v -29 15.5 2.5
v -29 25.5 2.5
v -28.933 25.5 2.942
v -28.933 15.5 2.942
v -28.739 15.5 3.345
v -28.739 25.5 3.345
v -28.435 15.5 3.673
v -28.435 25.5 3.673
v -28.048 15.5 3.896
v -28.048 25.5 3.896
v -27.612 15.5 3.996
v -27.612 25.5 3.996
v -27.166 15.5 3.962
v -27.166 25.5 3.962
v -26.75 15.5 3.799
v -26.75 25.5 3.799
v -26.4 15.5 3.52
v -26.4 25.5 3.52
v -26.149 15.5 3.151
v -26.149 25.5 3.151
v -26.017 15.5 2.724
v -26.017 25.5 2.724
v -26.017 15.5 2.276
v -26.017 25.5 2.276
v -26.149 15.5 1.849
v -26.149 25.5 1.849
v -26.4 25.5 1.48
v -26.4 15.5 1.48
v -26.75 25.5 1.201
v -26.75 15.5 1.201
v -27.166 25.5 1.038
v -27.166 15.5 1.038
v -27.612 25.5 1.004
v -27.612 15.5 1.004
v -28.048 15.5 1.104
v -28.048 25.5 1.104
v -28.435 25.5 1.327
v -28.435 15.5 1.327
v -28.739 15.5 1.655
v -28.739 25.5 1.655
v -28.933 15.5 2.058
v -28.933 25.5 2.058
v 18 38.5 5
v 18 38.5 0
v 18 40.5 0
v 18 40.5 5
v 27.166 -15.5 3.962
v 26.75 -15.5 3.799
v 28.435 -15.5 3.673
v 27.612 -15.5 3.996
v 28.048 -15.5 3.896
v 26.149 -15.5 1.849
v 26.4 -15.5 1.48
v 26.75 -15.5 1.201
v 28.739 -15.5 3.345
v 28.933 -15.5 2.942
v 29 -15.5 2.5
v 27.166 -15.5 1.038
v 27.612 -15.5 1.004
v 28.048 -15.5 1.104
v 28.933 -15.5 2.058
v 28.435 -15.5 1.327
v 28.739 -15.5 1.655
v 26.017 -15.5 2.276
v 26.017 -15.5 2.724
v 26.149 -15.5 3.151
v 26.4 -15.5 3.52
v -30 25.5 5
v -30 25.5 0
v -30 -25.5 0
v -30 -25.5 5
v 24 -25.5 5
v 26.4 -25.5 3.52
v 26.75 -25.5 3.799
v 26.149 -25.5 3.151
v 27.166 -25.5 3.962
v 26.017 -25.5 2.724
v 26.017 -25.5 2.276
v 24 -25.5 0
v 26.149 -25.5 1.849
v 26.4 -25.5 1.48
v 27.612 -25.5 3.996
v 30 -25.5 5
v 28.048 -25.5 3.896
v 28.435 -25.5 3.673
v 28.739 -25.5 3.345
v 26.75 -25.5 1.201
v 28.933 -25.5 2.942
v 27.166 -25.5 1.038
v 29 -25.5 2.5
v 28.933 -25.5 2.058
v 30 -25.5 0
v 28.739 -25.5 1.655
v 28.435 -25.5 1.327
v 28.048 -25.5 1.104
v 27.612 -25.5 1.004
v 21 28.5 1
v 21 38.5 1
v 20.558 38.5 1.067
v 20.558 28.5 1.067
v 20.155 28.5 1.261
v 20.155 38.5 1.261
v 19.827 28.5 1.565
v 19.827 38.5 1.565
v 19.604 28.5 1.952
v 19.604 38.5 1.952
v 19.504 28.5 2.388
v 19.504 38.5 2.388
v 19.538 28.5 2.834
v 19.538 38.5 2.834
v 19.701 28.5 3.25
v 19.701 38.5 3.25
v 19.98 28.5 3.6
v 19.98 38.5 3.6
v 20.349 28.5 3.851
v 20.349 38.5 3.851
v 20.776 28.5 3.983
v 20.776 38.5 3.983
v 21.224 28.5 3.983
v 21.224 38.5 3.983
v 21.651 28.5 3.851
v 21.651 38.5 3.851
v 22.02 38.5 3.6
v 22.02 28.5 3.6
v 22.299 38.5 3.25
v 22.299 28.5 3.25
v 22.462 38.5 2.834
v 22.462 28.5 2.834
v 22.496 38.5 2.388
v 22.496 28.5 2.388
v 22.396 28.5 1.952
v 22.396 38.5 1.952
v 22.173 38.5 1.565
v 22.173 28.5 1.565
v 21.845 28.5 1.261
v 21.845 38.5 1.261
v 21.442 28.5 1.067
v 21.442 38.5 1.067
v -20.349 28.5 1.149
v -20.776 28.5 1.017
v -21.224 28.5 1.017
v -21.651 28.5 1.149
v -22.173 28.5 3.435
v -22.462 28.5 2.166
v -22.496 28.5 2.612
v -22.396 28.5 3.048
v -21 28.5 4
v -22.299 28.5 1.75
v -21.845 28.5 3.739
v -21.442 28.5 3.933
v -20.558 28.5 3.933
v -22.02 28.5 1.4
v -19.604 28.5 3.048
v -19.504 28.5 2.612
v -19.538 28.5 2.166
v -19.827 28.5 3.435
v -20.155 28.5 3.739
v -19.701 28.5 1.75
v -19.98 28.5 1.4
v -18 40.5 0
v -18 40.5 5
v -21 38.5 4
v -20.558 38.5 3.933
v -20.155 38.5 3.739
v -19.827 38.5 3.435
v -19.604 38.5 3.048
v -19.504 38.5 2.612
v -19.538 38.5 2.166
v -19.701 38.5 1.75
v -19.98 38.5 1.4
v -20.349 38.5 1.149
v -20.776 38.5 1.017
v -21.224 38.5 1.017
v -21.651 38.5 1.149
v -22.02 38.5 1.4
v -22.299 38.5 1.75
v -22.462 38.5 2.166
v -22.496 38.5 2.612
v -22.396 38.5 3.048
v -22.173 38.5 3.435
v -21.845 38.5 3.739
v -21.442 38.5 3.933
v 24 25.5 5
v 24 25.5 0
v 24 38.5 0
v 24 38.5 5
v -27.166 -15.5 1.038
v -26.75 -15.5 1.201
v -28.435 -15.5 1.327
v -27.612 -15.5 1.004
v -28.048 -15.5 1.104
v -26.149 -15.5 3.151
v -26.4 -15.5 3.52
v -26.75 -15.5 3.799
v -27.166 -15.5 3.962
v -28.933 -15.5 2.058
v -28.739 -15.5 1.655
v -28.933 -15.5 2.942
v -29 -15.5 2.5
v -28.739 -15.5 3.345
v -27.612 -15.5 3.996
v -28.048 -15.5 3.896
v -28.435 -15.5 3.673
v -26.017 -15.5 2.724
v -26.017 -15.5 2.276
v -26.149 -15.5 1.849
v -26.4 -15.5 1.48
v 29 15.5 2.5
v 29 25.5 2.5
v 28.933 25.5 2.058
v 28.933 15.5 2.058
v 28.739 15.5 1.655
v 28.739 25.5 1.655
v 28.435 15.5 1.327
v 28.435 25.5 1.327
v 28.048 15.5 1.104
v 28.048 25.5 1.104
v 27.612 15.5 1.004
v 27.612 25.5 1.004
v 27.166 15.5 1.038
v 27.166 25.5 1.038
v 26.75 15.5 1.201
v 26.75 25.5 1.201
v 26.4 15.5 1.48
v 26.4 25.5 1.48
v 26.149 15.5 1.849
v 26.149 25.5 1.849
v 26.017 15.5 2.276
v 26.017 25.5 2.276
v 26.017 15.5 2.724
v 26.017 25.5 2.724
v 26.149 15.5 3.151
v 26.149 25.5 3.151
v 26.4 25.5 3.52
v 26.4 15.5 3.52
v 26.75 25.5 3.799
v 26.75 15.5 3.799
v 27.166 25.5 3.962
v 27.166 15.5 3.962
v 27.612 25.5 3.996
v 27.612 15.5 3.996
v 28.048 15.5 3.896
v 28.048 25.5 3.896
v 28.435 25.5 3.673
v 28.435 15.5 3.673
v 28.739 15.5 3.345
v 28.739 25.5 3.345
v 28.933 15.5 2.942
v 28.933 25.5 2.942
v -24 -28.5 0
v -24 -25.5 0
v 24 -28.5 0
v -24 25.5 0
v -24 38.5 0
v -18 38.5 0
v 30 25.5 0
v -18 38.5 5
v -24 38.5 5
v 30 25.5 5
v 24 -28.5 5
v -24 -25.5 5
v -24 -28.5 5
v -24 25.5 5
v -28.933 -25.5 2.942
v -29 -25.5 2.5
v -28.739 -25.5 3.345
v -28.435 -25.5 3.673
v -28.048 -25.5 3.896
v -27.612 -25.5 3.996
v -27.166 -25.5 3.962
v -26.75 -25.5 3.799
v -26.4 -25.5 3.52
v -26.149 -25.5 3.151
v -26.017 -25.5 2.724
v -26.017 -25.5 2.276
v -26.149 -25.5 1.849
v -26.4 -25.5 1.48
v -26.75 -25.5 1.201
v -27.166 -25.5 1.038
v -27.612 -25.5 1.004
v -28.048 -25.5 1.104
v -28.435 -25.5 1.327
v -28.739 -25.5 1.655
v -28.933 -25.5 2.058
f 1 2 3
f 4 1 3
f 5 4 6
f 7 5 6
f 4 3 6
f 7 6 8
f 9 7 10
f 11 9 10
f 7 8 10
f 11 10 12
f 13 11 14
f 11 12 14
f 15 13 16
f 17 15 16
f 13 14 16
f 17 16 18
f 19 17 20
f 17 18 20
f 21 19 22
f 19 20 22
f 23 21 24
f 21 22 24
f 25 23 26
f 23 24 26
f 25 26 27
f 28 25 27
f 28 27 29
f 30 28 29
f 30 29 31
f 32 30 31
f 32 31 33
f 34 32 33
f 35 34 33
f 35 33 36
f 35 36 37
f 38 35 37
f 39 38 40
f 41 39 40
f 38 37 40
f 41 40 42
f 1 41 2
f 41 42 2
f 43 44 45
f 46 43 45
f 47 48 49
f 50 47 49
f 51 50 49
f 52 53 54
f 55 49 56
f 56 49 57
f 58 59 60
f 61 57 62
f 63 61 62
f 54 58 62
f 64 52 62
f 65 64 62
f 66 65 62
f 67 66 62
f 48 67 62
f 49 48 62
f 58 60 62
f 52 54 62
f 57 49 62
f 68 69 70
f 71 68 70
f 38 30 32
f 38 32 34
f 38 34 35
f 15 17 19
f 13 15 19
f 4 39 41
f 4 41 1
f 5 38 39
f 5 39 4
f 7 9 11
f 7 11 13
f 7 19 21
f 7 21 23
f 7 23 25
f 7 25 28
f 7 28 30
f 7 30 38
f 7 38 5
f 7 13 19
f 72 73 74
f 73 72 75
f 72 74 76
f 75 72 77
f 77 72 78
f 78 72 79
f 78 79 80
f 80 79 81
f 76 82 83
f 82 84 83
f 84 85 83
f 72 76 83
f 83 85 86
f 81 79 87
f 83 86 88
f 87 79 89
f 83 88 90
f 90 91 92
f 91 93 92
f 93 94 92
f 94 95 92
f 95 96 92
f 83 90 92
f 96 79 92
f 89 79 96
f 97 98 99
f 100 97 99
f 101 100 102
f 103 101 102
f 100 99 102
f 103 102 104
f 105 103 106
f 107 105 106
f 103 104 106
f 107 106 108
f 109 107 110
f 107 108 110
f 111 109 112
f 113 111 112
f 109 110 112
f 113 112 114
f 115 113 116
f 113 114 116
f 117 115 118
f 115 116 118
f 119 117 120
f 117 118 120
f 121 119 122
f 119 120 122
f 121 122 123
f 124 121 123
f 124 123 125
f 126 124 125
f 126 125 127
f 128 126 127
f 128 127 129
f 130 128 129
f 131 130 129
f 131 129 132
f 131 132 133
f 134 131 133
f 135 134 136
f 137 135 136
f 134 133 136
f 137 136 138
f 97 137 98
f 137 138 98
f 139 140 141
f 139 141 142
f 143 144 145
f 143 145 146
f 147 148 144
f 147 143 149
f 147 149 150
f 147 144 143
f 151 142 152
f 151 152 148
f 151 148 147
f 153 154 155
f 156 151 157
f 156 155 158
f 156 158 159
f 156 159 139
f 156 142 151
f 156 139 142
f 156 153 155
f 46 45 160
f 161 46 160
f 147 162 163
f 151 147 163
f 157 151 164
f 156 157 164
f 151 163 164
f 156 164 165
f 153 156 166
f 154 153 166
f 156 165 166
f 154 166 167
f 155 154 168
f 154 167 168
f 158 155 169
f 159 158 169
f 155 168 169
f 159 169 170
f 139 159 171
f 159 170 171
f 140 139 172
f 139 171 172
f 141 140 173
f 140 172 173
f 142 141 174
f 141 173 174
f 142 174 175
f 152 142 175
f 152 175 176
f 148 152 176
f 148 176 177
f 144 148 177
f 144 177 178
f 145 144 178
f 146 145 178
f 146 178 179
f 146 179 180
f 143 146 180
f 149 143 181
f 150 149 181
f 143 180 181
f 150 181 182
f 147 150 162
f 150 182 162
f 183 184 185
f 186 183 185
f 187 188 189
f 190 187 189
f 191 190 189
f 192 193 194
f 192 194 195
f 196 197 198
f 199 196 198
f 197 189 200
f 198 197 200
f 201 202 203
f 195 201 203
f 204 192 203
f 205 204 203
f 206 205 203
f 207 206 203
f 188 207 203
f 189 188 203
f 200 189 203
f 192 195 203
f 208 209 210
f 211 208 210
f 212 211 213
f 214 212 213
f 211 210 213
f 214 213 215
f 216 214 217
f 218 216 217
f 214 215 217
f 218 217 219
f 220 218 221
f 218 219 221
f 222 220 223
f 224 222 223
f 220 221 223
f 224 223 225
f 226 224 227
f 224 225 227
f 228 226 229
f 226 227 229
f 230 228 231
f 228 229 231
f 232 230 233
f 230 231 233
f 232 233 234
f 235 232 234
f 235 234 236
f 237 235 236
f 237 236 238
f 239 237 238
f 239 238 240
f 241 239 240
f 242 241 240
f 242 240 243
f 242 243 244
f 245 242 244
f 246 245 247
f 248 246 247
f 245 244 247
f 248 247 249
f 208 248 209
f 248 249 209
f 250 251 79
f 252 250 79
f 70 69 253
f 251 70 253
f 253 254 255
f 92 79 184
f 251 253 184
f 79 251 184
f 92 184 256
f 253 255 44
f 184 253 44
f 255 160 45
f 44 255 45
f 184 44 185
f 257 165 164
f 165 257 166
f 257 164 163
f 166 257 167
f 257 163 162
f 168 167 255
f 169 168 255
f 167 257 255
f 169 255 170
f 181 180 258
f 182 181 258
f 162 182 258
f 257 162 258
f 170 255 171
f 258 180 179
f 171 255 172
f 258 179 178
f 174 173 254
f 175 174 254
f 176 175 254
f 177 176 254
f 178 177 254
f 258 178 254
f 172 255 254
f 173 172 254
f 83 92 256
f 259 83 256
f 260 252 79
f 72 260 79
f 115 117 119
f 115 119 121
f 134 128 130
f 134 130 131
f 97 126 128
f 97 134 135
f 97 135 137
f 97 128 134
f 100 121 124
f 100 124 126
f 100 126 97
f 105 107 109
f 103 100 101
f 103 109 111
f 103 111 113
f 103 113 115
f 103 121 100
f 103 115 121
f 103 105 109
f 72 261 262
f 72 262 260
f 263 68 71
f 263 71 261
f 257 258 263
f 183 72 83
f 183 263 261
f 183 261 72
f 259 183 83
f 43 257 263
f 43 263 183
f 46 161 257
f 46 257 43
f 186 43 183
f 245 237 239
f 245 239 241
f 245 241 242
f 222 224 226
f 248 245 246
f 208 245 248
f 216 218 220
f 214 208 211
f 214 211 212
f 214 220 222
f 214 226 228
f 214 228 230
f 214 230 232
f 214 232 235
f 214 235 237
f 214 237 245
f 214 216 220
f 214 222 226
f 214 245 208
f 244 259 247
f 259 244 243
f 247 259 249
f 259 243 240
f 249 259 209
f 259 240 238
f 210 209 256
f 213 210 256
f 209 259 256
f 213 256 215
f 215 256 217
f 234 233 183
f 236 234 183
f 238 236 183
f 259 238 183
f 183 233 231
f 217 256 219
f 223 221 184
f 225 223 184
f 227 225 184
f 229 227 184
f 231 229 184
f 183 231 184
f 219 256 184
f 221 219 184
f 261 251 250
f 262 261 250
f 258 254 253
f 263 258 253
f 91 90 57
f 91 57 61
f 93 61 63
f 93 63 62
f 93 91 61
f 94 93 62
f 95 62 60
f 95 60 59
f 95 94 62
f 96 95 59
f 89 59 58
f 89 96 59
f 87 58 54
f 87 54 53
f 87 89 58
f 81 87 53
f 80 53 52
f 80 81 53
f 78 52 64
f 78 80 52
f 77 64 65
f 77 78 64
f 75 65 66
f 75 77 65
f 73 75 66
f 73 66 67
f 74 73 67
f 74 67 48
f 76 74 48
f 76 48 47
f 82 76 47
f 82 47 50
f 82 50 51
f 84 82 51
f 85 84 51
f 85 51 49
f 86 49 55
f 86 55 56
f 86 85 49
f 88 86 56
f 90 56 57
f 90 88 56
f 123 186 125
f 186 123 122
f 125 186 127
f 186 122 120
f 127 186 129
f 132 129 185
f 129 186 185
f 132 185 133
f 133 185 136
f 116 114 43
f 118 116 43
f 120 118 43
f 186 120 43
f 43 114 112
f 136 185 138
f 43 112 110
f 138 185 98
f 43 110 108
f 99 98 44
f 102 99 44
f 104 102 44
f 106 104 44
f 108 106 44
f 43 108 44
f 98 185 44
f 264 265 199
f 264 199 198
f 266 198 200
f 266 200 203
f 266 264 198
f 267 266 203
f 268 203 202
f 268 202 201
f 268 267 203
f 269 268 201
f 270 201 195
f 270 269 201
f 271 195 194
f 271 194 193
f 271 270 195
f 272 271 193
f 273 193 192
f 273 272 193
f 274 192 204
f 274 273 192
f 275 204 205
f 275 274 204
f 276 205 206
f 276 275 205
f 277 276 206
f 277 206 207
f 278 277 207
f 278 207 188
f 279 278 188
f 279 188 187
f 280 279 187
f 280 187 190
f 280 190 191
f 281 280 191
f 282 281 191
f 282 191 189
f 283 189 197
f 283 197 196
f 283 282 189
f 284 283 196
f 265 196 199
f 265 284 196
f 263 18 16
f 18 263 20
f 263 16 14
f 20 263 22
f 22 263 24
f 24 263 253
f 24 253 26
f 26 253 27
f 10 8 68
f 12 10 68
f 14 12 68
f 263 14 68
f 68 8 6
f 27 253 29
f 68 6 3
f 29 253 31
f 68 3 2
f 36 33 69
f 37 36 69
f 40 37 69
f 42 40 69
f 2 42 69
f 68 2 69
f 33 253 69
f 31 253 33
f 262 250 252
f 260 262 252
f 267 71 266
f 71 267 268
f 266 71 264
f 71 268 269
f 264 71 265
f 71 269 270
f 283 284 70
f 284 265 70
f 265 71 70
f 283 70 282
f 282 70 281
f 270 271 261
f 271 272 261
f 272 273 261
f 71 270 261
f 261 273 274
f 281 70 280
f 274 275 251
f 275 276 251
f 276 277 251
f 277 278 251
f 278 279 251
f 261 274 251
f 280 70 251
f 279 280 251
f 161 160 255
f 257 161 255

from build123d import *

# Parameters (mm, degrees)
EXTRUDE_1_DEPTH     = 5
SKETCH_2_R          = 1.5
CUT_EXTRUDE_1_DEPTH = 10
SKETCH_3_R          = 1.5
CUT_EXTRUDE_2_DEPTH = 10


with BuildPart() as part:
    # ｽｹｯﾁ1 → ﾎﾞｽ - 押し出し1 (new body)
    with BuildSketch(Plane.XY):
        Polygon((30, -25.5), (30, 25.5), (24, 25.5), (24, 38.5), (18, 38.5), (18, 40.5), (-18, 40.5), (-18, 38.5), (-24, 38.5), (-24, 25.5), (-30, 25.5), (-30, -25.5), (-24, -25.5), (-24, -28.5), (24, -28.5), (24, -25.5), align=None)
    extrude(amount=EXTRUDE_1_DEPTH)

    # ｽｹｯﾁ2 → ｶｯﾄ - 押し出し1 (cut)
    with BuildSketch(Plane(origin=(0, 25.5, 0), x_dir=(1, 0, 0), z_dir=(0, 1, 0))):
        with Locations(Location((-27.5, -2.5, 0), (0, 0, 180))):
            Circle(SKETCH_2_R)
        with Locations((27.5, -2.5)):
            Circle(SKETCH_2_R)
    cut_extrude_1 = extrude(amount=-CUT_EXTRUDE_1_DEPTH, mode=Mode.SUBTRACT)

    # ﾐﾗｰ1: ｶｯﾄ - 押し出し1 across plane
    add(cut_extrude_1.mirror(Plane.ZX), mode=Mode.SUBTRACT)

    # ｽｹｯﾁ3 → ｶｯﾄ - 押し出し2 (cut)
    with BuildSketch(Plane(origin=(0, 38.5, 0), x_dir=(1, 0, 0), z_dir=(0, 1, 0))):
        with Locations(Location((-21, -2.5, 0), (0, 0, 270))):
            Circle(SKETCH_3_R)
        with Locations(Location((21, -2.5, 0), (0, 0, 90))):
            Circle(SKETCH_3_R)
    extrude(amount=-CUT_EXTRUDE_2_DEPTH, mode=Mode.SUBTRACT)


solid = part.part
